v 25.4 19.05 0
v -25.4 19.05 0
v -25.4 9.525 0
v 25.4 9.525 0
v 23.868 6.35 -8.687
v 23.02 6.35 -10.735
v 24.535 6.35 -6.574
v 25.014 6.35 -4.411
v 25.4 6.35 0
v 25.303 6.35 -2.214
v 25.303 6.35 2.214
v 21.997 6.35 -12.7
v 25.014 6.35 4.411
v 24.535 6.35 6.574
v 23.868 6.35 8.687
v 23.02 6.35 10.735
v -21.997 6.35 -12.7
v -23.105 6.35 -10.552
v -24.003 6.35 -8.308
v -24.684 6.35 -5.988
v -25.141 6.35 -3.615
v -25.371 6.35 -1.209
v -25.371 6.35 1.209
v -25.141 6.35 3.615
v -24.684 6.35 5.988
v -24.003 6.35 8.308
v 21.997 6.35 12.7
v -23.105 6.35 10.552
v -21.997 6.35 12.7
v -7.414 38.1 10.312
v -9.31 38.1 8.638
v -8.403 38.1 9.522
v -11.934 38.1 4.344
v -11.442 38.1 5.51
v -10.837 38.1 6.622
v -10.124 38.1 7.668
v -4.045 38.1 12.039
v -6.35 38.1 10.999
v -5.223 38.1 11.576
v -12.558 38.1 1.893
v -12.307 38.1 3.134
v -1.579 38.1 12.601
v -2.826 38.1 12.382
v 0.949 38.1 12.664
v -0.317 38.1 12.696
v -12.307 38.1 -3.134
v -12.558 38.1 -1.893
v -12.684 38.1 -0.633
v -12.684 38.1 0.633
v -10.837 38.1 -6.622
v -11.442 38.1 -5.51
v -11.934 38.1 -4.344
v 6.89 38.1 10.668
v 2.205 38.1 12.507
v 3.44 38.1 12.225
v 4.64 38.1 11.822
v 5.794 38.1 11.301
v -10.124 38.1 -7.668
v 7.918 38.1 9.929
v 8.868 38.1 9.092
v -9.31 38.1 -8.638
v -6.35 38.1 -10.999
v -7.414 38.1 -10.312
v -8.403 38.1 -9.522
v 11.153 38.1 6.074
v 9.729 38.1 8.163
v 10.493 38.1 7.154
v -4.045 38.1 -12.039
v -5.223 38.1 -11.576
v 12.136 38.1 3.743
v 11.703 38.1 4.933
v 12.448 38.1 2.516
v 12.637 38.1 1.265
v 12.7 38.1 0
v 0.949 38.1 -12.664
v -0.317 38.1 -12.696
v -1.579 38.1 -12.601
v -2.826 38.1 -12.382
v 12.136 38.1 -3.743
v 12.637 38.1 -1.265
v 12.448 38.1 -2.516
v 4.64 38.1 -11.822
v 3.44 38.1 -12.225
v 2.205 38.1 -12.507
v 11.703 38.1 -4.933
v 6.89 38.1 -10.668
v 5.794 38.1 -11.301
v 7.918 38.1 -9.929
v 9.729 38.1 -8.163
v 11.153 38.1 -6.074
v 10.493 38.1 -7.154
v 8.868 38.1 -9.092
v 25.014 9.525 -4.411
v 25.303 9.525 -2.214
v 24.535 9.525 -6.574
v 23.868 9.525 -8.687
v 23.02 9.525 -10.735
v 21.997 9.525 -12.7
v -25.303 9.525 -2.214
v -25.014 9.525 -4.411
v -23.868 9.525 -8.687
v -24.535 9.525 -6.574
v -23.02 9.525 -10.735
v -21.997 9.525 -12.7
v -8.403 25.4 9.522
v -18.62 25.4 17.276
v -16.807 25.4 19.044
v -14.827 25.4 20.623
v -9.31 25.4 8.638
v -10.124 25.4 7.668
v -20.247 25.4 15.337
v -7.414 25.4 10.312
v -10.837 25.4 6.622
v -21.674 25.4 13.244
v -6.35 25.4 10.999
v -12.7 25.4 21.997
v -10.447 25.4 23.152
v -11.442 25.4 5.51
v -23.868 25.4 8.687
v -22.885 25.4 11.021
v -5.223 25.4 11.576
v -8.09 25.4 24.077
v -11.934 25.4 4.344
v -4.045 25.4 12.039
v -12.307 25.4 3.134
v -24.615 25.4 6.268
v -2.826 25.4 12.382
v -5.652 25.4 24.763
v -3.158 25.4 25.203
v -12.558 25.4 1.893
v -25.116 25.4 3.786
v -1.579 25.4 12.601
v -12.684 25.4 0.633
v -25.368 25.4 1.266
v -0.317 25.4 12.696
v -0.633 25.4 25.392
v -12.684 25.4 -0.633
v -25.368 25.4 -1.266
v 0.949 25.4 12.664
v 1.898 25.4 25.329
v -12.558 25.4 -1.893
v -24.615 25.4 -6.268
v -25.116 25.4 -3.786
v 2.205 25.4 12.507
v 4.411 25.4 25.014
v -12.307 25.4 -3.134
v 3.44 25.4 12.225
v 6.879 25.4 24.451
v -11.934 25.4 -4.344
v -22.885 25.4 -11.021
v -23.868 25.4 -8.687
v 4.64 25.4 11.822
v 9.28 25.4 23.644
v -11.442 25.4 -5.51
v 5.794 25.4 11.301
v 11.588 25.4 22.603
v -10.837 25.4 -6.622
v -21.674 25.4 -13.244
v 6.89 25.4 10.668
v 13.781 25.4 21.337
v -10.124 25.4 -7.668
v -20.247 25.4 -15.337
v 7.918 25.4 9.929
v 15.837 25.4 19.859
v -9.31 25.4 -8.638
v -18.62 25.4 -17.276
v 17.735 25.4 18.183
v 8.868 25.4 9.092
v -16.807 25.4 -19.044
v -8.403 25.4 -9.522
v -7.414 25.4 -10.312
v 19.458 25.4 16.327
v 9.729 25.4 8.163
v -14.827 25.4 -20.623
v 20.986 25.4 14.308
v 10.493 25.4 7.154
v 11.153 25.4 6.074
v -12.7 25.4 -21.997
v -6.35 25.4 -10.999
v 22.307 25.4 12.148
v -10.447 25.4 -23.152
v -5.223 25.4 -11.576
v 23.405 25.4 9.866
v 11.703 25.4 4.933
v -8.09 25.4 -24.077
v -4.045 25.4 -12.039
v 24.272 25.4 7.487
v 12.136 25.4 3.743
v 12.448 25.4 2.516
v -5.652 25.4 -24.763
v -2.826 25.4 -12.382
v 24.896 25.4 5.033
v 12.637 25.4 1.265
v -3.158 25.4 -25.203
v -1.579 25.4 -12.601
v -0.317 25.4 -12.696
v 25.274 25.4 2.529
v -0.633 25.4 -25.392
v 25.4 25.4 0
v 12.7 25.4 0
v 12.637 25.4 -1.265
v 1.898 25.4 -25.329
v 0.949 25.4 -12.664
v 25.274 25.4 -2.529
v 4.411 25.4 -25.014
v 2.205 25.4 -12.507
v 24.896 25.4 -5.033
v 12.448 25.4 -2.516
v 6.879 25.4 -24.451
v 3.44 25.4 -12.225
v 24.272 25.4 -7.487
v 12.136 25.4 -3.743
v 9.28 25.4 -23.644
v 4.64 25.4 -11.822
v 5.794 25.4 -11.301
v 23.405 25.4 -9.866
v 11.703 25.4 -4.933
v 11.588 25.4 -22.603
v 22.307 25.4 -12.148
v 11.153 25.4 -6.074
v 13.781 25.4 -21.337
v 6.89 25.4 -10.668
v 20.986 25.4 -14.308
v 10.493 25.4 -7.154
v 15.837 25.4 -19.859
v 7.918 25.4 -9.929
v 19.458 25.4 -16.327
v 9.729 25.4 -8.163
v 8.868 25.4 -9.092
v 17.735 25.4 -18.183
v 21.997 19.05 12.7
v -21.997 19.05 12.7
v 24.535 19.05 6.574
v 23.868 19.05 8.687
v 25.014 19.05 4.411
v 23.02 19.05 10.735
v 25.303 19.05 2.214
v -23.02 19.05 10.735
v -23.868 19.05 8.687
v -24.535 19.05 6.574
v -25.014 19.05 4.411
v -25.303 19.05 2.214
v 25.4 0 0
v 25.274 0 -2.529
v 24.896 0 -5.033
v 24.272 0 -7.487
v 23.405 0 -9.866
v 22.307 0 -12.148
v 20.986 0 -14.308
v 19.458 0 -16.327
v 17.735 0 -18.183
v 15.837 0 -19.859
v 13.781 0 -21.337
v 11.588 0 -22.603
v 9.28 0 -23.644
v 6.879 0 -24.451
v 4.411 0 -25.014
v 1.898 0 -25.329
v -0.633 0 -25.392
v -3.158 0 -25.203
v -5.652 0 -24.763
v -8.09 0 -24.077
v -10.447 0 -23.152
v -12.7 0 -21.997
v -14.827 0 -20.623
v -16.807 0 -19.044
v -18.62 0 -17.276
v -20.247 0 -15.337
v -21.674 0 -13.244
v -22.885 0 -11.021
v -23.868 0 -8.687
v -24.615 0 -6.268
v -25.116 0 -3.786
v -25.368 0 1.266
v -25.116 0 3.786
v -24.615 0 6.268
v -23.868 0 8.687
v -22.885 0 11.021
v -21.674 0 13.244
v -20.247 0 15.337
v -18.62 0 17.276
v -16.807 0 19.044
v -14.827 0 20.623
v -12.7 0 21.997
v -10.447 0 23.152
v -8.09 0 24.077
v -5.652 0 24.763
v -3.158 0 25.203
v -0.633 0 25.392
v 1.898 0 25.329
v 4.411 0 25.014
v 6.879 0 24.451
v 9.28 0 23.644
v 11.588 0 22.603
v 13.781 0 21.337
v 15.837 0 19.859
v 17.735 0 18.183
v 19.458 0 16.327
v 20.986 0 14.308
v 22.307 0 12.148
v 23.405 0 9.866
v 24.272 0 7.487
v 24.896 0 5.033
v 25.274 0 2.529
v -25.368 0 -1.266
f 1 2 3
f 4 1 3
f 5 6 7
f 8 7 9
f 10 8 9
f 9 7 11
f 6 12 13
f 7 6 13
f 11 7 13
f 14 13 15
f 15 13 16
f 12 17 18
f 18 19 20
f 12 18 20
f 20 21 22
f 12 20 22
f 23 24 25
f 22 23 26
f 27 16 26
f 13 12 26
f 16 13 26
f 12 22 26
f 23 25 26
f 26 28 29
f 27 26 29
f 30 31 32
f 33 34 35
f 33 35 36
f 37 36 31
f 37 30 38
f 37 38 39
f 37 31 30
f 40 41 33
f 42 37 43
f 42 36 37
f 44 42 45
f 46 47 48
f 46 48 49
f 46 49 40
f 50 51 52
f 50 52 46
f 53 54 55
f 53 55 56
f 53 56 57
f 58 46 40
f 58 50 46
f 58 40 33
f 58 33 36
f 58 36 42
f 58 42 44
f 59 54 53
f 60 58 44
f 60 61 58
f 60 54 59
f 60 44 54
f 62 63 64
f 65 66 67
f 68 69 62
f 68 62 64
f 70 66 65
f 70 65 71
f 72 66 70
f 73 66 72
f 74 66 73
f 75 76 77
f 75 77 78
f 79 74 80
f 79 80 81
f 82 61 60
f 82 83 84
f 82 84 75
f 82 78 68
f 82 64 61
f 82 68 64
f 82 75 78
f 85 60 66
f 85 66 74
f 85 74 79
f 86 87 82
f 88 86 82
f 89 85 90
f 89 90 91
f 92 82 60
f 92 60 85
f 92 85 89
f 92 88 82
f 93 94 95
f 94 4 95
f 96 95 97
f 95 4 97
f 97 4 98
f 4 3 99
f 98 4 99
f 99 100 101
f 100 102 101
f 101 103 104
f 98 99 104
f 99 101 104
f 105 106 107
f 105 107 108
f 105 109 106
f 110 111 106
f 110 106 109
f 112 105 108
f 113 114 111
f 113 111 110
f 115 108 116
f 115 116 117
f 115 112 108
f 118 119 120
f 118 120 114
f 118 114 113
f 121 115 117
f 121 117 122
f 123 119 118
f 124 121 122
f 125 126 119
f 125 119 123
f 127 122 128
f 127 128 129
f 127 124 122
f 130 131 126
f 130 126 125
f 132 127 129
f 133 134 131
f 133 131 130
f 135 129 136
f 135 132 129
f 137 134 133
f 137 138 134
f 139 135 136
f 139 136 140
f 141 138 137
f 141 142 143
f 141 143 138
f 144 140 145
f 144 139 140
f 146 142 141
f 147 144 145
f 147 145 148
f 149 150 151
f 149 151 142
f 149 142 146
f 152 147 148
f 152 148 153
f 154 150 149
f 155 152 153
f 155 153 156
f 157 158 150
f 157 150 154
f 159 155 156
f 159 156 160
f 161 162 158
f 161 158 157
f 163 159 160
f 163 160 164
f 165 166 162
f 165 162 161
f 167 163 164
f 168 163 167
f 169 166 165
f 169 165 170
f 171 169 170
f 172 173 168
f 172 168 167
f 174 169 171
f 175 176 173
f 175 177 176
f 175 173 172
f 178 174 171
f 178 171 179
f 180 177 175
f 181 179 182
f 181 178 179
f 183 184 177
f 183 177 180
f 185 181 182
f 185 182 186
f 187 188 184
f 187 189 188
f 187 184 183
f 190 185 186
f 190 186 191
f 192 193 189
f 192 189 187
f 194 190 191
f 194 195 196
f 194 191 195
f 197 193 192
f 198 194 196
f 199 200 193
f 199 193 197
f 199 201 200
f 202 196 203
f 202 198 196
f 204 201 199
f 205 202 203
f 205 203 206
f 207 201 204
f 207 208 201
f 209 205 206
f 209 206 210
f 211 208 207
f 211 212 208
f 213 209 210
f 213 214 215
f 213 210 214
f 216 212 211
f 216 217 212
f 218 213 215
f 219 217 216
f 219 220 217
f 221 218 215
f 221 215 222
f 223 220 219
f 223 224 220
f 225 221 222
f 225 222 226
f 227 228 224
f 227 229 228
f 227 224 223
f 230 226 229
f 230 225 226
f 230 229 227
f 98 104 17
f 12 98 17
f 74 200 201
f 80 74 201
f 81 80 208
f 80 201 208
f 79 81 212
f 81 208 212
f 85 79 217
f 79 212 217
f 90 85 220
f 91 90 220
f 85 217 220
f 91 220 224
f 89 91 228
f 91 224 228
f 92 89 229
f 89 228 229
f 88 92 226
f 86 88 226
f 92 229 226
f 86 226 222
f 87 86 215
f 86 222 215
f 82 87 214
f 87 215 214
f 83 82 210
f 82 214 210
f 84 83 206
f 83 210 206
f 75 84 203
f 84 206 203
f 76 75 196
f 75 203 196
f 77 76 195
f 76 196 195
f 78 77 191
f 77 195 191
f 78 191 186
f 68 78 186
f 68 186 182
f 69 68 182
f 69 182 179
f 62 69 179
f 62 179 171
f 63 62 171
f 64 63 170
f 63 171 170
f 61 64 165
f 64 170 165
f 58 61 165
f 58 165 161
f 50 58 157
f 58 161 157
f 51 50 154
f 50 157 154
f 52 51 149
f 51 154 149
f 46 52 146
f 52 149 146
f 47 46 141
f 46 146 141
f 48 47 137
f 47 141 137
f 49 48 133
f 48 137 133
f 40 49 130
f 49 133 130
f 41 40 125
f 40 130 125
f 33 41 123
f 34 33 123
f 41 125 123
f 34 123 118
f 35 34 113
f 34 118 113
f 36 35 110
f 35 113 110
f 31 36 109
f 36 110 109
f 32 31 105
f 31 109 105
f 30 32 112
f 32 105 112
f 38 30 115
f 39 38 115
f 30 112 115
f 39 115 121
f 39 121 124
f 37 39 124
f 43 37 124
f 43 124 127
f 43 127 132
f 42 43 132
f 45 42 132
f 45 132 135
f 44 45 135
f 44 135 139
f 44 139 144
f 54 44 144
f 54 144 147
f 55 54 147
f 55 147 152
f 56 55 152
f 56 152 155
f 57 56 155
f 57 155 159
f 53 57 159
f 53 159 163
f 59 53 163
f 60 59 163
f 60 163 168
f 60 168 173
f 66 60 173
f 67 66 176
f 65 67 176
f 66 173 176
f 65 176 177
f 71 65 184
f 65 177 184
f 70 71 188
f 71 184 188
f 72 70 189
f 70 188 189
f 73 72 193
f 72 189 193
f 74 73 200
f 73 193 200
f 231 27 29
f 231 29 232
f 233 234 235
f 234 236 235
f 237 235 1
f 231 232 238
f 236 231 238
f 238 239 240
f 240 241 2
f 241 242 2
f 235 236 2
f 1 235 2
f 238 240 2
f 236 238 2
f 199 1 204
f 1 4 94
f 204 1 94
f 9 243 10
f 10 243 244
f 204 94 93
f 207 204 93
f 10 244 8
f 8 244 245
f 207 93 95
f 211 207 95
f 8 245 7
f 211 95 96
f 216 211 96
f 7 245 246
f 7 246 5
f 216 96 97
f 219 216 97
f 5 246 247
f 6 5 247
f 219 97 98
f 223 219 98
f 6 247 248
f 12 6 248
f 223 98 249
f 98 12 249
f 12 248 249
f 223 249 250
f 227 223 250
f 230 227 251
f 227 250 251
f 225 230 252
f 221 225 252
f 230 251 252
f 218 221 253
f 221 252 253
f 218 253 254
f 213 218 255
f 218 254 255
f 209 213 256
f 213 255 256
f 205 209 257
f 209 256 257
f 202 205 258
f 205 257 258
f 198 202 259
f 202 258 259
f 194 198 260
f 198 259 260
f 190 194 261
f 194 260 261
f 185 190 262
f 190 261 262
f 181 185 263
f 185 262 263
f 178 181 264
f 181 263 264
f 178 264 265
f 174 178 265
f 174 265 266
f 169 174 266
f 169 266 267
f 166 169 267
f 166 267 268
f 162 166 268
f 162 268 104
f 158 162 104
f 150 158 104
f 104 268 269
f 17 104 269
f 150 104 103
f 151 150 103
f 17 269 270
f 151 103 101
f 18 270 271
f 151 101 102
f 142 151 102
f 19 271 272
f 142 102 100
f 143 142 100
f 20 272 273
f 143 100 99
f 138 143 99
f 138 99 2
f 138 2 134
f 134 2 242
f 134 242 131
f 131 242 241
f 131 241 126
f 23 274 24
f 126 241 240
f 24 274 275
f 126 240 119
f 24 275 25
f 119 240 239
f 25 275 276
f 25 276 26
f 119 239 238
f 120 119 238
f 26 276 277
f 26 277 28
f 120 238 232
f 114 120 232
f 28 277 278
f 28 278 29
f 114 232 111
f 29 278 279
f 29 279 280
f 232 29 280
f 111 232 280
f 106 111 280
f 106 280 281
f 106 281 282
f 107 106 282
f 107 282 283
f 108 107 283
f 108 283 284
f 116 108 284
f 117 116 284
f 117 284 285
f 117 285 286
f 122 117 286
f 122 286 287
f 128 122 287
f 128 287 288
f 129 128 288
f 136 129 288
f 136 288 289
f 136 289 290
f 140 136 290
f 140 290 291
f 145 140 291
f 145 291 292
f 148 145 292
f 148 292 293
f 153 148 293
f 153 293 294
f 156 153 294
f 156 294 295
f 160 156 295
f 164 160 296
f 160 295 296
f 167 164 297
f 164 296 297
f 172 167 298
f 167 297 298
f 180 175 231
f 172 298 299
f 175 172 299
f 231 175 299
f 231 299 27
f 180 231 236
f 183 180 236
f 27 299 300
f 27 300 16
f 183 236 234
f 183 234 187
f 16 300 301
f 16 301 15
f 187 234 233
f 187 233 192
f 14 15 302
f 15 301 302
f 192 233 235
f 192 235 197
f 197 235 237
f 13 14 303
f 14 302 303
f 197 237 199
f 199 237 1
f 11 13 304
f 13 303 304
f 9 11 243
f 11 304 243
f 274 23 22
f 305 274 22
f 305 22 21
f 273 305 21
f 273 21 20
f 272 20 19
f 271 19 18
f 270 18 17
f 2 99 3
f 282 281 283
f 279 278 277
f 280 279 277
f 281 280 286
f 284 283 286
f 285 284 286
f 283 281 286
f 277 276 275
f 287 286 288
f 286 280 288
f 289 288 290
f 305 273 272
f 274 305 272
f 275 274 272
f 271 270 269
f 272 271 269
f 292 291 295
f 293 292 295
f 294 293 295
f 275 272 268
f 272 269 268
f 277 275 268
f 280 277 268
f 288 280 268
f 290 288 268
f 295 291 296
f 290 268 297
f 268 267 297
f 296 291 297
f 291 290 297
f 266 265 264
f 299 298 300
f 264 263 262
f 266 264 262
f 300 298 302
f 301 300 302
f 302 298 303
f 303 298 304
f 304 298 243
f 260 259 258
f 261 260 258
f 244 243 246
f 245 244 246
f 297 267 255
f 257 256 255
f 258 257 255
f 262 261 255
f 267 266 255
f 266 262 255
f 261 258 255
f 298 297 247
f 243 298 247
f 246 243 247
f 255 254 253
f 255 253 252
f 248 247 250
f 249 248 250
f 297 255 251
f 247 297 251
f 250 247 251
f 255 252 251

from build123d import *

# Parameters (mm, degrees)
SKETCH3_R               = 25.4
BOSS_EXTRUDE1_DEPTH     = 25.4
SKETCH4_R               = 12.7
BOSS_EXTRUDE2_DEPTH     = 12.7
CUT_EXTRUDE1_DEPTH      = 26.4
CUT_EXTRUDE1_DEPTH_BACK = 26.4


with BuildPart() as part:
    # Sketch3 → Boss-Extrude1 (new body)
    with BuildSketch(Plane(origin=(0, 0, 0), x_dir=(1, 0, 0), z_dir=(0, 1, 0))):
        Circle(SKETCH3_R)
    extrude(amount=BOSS_EXTRUDE1_DEPTH)

    # Sketch4 → Boss-Extrude2 (add)
    with BuildSketch(Plane(origin=(0, 25.4, 0), x_dir=(1, 0, 0), z_dir=(0, 1, 0))):
        Circle(SKETCH4_R)
    extrude(amount=BOSS_EXTRUDE2_DEPTH)

    # Sketch5 → Cut-Extrude1 (cut, two sides)
    with BuildSketch(Plane(origin=(0, 0, 0), x_dir=(0, 0, -1), z_dir=(1, 0, 0))) as cut_extrude1_sk:
        Polygon((12.7, 6.35), (-12.7, 6.35), (-12.7, 19.05), (0, 19.05), (0, 9.525), (12.7, 9.525), align=None)
    extrude(amount=CUT_EXTRUDE1_DEPTH, mode=Mode.SUBTRACT)
    extrude(cut_extrude1_sk.sketch, amount=-CUT_EXTRUDE1_DEPTH_BACK, mode=Mode.SUBTRACT)


solid = part.part
